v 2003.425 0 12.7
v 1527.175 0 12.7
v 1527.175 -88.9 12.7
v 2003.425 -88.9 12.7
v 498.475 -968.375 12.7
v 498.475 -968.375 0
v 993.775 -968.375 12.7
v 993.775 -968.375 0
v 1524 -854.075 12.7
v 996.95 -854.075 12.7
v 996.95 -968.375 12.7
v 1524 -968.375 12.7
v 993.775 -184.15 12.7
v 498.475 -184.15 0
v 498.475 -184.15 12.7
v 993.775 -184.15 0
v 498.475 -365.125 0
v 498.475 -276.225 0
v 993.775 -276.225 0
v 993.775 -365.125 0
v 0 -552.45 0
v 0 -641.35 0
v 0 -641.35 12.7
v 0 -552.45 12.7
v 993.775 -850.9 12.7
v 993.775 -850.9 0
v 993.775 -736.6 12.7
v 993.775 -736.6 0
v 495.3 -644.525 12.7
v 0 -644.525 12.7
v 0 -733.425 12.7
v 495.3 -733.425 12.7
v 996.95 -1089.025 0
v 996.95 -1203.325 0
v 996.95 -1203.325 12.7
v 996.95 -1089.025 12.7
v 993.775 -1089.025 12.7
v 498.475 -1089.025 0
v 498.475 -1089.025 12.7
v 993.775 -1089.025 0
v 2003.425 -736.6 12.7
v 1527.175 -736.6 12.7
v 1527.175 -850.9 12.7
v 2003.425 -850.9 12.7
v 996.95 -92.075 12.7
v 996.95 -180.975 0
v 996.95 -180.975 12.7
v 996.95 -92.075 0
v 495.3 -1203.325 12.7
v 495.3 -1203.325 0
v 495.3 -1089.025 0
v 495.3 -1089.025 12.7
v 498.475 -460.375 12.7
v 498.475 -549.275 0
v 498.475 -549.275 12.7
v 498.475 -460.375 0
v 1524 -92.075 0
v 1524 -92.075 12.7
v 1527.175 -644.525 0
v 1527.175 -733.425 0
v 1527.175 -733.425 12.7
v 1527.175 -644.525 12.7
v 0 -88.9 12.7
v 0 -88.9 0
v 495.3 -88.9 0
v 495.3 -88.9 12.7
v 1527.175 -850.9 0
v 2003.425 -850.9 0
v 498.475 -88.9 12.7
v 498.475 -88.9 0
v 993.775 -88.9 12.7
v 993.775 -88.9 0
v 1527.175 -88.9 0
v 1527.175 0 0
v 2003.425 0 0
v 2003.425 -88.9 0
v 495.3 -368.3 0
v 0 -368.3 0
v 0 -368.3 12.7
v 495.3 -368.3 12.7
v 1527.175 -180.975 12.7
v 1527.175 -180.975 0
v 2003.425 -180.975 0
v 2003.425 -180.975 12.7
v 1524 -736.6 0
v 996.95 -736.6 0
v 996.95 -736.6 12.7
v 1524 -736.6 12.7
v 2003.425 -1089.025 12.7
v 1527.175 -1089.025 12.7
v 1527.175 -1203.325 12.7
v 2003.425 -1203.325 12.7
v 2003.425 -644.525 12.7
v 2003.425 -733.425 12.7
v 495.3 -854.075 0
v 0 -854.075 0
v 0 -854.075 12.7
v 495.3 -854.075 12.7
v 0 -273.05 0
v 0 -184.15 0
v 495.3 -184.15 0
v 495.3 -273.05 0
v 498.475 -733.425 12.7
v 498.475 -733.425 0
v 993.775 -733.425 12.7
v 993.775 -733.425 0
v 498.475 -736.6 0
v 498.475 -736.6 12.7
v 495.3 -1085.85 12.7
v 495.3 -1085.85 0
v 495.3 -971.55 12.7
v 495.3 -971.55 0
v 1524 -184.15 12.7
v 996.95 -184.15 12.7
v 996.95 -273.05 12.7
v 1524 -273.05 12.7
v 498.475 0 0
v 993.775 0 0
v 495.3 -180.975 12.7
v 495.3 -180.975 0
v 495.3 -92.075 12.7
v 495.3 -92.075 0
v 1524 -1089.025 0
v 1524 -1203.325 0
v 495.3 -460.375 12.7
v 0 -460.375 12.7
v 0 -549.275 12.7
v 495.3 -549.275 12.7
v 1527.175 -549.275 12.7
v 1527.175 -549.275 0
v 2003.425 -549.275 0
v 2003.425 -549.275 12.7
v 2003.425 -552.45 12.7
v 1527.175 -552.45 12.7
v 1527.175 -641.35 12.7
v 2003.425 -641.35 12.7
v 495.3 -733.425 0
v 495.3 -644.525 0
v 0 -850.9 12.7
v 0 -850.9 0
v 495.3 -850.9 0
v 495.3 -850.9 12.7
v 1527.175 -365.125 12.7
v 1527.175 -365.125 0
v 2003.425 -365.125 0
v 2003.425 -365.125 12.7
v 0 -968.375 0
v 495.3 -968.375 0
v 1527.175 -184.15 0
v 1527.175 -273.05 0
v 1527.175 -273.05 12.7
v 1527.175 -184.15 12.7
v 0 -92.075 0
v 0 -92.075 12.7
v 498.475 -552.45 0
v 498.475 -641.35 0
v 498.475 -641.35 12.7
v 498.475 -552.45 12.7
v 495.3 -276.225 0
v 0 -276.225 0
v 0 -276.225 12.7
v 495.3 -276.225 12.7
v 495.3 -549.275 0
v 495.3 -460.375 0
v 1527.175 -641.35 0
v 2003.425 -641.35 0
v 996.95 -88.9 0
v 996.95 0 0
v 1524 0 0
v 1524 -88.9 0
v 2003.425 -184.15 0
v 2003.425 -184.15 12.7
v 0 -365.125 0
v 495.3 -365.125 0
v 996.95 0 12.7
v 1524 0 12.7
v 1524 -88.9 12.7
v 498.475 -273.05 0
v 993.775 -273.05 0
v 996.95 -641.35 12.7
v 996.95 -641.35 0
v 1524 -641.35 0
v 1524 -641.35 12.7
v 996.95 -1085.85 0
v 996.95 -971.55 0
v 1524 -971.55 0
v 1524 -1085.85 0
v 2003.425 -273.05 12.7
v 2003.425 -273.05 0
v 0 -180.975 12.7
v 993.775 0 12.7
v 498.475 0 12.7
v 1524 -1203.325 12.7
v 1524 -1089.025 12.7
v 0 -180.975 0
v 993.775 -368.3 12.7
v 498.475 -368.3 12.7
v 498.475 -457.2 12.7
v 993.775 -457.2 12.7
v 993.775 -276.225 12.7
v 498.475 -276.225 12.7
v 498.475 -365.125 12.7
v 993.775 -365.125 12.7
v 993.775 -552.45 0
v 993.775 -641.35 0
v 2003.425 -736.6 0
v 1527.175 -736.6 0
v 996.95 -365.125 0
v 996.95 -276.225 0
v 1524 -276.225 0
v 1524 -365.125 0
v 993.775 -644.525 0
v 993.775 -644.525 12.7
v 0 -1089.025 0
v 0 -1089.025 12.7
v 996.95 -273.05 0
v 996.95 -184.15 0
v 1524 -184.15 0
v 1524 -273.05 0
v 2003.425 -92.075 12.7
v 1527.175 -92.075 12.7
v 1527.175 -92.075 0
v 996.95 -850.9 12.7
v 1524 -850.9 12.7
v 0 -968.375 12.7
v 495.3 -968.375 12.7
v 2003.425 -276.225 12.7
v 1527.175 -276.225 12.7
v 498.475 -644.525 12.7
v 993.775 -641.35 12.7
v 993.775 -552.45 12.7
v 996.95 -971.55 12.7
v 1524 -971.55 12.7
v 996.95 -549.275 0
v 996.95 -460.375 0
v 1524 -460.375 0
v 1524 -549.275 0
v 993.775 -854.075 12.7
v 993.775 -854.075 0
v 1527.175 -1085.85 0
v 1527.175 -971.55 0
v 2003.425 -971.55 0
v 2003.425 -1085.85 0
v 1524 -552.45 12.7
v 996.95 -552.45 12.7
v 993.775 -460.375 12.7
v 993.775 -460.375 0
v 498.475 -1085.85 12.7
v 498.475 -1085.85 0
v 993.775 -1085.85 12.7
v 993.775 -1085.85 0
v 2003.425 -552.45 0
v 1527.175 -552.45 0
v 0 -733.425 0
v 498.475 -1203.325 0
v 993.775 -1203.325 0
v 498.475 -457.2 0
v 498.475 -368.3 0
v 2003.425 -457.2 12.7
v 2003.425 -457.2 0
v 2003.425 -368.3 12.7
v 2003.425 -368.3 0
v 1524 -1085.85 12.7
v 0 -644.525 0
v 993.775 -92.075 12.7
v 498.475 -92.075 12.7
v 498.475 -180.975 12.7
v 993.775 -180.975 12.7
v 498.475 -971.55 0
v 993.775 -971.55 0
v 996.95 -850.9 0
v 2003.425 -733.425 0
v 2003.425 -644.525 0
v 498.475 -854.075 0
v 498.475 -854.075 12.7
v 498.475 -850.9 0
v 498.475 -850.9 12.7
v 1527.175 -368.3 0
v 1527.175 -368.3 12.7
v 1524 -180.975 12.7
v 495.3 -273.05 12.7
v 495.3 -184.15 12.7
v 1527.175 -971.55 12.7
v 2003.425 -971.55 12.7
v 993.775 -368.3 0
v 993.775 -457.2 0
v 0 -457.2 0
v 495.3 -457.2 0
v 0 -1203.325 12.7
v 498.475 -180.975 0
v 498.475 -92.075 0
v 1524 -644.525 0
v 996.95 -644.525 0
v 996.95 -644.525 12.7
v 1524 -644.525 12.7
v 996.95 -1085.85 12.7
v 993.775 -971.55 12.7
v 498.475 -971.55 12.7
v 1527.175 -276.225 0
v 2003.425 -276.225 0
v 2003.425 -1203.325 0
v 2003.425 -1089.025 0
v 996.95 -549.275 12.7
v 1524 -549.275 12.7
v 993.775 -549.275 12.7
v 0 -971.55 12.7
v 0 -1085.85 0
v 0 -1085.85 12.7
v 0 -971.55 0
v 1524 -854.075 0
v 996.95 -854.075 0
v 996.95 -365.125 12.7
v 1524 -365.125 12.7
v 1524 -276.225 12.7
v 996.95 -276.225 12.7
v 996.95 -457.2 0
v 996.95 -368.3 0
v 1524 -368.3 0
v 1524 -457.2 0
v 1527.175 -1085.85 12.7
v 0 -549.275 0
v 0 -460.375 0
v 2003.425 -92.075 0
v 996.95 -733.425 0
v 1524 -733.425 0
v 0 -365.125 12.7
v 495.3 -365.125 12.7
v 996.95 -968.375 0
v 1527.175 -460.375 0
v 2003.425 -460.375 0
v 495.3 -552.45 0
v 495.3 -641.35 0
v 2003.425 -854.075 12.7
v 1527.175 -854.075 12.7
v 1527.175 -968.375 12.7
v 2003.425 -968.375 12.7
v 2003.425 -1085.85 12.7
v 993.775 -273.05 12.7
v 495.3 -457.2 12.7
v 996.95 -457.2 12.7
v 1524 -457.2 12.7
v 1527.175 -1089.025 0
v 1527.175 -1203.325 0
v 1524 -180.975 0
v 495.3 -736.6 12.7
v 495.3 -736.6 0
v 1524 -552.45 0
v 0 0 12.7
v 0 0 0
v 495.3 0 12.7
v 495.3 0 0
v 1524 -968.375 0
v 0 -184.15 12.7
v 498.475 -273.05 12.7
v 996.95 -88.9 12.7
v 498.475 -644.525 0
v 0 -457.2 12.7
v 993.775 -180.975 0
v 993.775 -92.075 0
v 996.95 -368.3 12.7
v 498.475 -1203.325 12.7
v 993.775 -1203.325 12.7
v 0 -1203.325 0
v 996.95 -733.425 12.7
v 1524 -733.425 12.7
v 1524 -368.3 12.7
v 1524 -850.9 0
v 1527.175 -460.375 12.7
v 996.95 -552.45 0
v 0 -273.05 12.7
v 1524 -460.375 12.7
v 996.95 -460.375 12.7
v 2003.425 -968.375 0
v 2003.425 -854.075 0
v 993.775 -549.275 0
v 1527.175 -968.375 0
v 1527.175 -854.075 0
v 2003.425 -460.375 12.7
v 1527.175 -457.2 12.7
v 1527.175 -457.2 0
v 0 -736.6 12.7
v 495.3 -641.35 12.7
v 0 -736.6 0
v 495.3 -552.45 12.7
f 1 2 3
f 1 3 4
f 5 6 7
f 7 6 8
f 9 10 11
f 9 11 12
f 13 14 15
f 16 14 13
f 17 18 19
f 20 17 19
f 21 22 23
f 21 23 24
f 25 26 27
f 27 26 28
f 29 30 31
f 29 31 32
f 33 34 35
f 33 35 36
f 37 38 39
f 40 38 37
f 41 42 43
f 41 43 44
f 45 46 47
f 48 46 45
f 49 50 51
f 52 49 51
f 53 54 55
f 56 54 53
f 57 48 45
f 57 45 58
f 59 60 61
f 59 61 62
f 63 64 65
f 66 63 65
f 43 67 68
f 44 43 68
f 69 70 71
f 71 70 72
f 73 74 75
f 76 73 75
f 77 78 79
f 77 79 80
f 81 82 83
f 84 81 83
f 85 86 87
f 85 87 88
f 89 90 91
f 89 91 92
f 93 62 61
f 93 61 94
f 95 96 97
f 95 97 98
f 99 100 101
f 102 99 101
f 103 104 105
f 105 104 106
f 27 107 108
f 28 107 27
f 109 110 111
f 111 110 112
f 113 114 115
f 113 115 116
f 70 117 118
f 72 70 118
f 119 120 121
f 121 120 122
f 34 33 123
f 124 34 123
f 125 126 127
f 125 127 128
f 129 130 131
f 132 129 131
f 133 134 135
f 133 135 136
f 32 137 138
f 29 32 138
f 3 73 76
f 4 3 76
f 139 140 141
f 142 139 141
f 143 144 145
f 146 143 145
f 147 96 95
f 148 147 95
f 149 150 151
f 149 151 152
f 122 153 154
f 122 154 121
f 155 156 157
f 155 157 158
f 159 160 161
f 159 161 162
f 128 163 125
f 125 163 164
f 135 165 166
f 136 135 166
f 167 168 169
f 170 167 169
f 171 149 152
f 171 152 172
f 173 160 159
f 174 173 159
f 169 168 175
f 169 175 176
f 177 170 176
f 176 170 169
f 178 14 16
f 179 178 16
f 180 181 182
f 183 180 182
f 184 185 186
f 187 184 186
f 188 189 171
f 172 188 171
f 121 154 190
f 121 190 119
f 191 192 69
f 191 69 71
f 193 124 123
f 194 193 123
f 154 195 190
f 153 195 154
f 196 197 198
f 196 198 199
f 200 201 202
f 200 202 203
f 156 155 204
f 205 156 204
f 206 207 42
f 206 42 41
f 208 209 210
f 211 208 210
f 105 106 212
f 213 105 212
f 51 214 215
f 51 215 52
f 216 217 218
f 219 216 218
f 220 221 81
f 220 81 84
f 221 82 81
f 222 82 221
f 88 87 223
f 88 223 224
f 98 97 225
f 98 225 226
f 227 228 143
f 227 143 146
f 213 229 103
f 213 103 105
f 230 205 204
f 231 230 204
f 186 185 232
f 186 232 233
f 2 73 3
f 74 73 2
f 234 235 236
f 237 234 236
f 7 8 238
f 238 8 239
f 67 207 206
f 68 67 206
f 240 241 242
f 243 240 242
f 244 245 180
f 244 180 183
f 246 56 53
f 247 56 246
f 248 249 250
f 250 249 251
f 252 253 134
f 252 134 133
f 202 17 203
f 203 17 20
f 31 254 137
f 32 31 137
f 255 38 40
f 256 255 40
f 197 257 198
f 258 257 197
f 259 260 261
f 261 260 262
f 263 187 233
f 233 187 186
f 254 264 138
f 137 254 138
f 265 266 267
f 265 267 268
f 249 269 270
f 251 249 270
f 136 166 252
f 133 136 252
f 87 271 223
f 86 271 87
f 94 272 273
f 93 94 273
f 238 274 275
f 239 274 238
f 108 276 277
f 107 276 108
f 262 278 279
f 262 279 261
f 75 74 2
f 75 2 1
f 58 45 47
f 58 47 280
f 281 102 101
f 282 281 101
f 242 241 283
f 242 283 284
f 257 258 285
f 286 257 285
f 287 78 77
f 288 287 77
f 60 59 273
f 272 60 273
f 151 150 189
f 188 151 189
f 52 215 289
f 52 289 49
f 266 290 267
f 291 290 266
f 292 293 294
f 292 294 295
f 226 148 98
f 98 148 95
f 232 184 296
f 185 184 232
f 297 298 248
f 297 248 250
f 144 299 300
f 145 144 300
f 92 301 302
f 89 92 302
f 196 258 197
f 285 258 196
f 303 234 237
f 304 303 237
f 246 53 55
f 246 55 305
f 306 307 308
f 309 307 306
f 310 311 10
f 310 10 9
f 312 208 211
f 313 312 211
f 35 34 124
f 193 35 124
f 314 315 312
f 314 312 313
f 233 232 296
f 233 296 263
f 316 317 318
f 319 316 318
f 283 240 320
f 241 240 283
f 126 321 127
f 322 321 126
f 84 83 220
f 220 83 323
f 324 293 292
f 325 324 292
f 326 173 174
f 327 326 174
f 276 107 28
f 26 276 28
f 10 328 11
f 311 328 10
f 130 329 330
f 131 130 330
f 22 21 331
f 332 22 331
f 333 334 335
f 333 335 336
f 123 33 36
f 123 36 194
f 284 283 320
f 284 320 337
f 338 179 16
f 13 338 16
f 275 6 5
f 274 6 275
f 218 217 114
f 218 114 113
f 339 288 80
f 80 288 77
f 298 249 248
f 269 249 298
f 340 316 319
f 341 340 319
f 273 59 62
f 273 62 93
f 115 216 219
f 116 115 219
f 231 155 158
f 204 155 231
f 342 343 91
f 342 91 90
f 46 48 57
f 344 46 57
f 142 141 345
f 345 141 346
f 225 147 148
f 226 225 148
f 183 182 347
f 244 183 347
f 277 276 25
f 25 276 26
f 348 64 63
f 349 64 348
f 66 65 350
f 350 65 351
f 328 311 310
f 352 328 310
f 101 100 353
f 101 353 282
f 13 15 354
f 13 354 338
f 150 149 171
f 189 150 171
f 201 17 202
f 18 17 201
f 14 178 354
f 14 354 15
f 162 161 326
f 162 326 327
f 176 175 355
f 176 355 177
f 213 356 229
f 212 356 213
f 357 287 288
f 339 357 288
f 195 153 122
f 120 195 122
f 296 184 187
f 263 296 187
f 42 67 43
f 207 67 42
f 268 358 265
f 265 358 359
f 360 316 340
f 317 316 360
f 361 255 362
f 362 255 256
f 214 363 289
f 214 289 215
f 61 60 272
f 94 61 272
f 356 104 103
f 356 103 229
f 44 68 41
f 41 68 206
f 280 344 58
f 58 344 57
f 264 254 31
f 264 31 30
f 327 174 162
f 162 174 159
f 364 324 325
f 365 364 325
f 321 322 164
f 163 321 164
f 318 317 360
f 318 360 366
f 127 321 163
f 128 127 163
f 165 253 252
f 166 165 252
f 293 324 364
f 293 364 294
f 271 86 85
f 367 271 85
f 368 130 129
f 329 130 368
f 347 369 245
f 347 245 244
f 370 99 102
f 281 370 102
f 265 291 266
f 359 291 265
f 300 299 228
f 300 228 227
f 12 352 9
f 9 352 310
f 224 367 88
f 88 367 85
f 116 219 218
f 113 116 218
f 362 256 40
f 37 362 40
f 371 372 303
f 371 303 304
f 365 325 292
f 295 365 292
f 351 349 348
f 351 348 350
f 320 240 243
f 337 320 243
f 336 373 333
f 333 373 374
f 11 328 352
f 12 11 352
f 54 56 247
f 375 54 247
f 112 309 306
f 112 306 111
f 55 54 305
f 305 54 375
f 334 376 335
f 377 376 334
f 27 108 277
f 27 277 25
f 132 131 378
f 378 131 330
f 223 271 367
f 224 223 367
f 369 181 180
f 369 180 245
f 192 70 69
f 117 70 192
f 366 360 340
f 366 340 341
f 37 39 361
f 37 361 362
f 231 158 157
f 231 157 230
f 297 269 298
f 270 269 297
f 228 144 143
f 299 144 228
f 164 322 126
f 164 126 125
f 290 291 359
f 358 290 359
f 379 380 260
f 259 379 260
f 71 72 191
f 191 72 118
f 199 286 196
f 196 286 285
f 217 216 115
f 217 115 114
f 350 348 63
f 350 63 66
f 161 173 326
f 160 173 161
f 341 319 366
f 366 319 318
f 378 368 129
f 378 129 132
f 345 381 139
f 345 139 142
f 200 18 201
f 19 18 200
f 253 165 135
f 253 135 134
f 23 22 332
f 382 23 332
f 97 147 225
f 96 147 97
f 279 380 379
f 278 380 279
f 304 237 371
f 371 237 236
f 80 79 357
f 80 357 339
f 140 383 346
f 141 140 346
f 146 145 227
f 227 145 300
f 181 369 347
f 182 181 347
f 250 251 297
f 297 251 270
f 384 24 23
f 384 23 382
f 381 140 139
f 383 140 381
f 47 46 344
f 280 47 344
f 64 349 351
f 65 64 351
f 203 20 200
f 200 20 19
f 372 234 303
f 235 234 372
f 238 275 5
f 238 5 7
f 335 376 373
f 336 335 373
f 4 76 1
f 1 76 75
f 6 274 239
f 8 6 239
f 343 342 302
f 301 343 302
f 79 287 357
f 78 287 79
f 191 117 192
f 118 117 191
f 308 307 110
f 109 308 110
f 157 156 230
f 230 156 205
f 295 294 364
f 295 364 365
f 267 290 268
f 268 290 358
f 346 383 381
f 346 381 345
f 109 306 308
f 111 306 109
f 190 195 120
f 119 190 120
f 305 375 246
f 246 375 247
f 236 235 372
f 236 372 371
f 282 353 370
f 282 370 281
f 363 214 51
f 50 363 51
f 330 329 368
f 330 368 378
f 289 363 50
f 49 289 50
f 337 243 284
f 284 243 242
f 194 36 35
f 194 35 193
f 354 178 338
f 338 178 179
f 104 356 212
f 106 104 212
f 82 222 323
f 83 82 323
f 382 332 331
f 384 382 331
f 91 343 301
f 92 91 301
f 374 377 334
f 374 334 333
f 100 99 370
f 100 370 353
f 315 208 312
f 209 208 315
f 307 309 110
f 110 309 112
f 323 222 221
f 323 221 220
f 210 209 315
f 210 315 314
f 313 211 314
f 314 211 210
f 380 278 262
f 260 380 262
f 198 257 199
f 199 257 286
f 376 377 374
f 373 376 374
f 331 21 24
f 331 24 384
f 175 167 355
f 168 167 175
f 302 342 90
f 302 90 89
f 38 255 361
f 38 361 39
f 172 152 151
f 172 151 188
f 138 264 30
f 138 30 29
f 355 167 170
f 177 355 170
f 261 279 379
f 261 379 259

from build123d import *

# Parameters (mm, degrees)
F0_W     = 495.3
F0_H     = 88.9
F0_W_2   = 527.05
F0_W_3   = 476.25
F0_H_2   = 114.3
F1_DEPTH = 12.7


with BuildPart() as f1:
    # F0 (on Top) → F1 (new body)
    with BuildSketch(Plane.XY):
        with Locations((247.65, -44.45)):
            Rectangle(F0_W, F0_H)
        with Locations((247.65, -136.525)):
            Rectangle(F0_W, F0_H)
        with Locations((247.65, -228.6)):
            Rectangle(F0_W, F0_H)
        with Locations((247.65, -320.675)):
            Rectangle(F0_W, F0_H)
        with Locations((247.65, -412.75)):
            Rectangle(F0_W, F0_H)
        with Locations((247.65, -504.825)):
            Rectangle(F0_W, F0_H)
        with Locations((247.65, -596.9)):
            Rectangle(F0_W, F0_H)
        with Locations((247.65, -688.975)):
            Rectangle(F0_W, F0_H)
        with Locations((746.125, -44.45)):
            Rectangle(F0_W, F0_H)
        with Locations((746.125, -136.525)):
            Rectangle(F0_W, F0_H)
        with Locations((746.125, -228.6)):
            Rectangle(F0_W, F0_H)
        with Locations((746.125, -320.675)):
            Rectangle(F0_W, F0_H)
        with Locations((746.125, -412.75)):
            Rectangle(F0_W, F0_H)
        with Locations((746.125, -504.825)):
            Rectangle(F0_W, F0_H)
        with Locations((746.125, -596.9)):
            Rectangle(F0_W, F0_H)
        with Locations((746.125, -688.975)):
            Rectangle(F0_W, F0_H)
        with Locations((1260.475, -44.45)):
            Rectangle(F0_W_2, F0_H)
        with Locations((1260.475, -136.525)):
            Rectangle(F0_W_2, F0_H)
        with Locations((1260.475, -228.6)):
            Rectangle(F0_W_2, F0_H)
        with Locations((1260.475, -320.675)):
            Rectangle(F0_W_2, F0_H)
        with Locations((1260.475, -412.75)):
            Rectangle(F0_W_2, F0_H)
        with Locations((1260.475, -504.825)):
            Rectangle(F0_W_2, F0_H)
        with Locations((1260.475, -596.9)):
            Rectangle(F0_W_2, F0_H)
        with Locations((1260.475, -688.975)):
            Rectangle(F0_W_2, F0_H)
        with Locations((1765.3, -44.45)):
            Rectangle(F0_W_3, F0_H)
        with Locations((1765.3, -136.525)):
            Rectangle(F0_W_3, F0_H)
        with Locations((1765.3, -228.6)):
            Rectangle(F0_W_3, F0_H)
        with Locations((1765.3, -320.675)):
            Rectangle(F0_W_3, F0_H)
        with Locations((1765.3, -412.75)):
            Rectangle(F0_W_3, F0_H)
        with Locations((1765.3, -504.825)):
            Rectangle(F0_W_3, F0_H)
        with Locations((1765.3, -596.9)):
            Rectangle(F0_W_3, F0_H)
        with Locations((1765.3, -688.975)):
            Rectangle(F0_W_3, F0_H)
        with Locations((247.65, -793.75)):
            Rectangle(F0_W, F0_H_2)
        with Locations((247.65, -911.225)):
            Rectangle(F0_W, F0_H_2)
        with Locations((247.65, -1028.7)):
            Rectangle(F0_W, F0_H_2)
        with Locations((247.65, -1146.175)):
            Rectangle(F0_W, F0_H_2)
        with Locations((746.125, -793.75)):
            Rectangle(F0_W, F0_H_2)
        with Locations((746.125, -911.225)):
            Rectangle(F0_W, F0_H_2)
        with Locations((746.125, -1028.7)):
            Rectangle(F0_W, F0_H_2)
        with Locations((746.125, -1146.175)):
            Rectangle(F0_W, F0_H_2)
        with Locations((1260.475, -793.75)):
            Rectangle(F0_W_2, F0_H_2)
        with Locations((1260.475, -911.225)):
            Rectangle(F0_W_2, F0_H_2)
        with Locations((1260.475, -1028.7)):
            Rectangle(F0_W_2, F0_H_2)
        with Locations((1260.475, -1146.175)):
            Rectangle(F0_W_2, F0_H_2)
        with Locations((1765.3, -793.75)):
            Rectangle(F0_W_3, F0_H_2)
        with Locations((1765.3, -911.225)):
            Rectangle(F0_W_3, F0_H_2)
        with Locations((1765.3, -1028.7)):
            Rectangle(F0_W_3, F0_H_2)
        with Locations((1765.3, -1146.175)):
            Rectangle(F0_W_3, F0_H_2)
    extrude(amount=F1_DEPTH)


solid = f1.part
